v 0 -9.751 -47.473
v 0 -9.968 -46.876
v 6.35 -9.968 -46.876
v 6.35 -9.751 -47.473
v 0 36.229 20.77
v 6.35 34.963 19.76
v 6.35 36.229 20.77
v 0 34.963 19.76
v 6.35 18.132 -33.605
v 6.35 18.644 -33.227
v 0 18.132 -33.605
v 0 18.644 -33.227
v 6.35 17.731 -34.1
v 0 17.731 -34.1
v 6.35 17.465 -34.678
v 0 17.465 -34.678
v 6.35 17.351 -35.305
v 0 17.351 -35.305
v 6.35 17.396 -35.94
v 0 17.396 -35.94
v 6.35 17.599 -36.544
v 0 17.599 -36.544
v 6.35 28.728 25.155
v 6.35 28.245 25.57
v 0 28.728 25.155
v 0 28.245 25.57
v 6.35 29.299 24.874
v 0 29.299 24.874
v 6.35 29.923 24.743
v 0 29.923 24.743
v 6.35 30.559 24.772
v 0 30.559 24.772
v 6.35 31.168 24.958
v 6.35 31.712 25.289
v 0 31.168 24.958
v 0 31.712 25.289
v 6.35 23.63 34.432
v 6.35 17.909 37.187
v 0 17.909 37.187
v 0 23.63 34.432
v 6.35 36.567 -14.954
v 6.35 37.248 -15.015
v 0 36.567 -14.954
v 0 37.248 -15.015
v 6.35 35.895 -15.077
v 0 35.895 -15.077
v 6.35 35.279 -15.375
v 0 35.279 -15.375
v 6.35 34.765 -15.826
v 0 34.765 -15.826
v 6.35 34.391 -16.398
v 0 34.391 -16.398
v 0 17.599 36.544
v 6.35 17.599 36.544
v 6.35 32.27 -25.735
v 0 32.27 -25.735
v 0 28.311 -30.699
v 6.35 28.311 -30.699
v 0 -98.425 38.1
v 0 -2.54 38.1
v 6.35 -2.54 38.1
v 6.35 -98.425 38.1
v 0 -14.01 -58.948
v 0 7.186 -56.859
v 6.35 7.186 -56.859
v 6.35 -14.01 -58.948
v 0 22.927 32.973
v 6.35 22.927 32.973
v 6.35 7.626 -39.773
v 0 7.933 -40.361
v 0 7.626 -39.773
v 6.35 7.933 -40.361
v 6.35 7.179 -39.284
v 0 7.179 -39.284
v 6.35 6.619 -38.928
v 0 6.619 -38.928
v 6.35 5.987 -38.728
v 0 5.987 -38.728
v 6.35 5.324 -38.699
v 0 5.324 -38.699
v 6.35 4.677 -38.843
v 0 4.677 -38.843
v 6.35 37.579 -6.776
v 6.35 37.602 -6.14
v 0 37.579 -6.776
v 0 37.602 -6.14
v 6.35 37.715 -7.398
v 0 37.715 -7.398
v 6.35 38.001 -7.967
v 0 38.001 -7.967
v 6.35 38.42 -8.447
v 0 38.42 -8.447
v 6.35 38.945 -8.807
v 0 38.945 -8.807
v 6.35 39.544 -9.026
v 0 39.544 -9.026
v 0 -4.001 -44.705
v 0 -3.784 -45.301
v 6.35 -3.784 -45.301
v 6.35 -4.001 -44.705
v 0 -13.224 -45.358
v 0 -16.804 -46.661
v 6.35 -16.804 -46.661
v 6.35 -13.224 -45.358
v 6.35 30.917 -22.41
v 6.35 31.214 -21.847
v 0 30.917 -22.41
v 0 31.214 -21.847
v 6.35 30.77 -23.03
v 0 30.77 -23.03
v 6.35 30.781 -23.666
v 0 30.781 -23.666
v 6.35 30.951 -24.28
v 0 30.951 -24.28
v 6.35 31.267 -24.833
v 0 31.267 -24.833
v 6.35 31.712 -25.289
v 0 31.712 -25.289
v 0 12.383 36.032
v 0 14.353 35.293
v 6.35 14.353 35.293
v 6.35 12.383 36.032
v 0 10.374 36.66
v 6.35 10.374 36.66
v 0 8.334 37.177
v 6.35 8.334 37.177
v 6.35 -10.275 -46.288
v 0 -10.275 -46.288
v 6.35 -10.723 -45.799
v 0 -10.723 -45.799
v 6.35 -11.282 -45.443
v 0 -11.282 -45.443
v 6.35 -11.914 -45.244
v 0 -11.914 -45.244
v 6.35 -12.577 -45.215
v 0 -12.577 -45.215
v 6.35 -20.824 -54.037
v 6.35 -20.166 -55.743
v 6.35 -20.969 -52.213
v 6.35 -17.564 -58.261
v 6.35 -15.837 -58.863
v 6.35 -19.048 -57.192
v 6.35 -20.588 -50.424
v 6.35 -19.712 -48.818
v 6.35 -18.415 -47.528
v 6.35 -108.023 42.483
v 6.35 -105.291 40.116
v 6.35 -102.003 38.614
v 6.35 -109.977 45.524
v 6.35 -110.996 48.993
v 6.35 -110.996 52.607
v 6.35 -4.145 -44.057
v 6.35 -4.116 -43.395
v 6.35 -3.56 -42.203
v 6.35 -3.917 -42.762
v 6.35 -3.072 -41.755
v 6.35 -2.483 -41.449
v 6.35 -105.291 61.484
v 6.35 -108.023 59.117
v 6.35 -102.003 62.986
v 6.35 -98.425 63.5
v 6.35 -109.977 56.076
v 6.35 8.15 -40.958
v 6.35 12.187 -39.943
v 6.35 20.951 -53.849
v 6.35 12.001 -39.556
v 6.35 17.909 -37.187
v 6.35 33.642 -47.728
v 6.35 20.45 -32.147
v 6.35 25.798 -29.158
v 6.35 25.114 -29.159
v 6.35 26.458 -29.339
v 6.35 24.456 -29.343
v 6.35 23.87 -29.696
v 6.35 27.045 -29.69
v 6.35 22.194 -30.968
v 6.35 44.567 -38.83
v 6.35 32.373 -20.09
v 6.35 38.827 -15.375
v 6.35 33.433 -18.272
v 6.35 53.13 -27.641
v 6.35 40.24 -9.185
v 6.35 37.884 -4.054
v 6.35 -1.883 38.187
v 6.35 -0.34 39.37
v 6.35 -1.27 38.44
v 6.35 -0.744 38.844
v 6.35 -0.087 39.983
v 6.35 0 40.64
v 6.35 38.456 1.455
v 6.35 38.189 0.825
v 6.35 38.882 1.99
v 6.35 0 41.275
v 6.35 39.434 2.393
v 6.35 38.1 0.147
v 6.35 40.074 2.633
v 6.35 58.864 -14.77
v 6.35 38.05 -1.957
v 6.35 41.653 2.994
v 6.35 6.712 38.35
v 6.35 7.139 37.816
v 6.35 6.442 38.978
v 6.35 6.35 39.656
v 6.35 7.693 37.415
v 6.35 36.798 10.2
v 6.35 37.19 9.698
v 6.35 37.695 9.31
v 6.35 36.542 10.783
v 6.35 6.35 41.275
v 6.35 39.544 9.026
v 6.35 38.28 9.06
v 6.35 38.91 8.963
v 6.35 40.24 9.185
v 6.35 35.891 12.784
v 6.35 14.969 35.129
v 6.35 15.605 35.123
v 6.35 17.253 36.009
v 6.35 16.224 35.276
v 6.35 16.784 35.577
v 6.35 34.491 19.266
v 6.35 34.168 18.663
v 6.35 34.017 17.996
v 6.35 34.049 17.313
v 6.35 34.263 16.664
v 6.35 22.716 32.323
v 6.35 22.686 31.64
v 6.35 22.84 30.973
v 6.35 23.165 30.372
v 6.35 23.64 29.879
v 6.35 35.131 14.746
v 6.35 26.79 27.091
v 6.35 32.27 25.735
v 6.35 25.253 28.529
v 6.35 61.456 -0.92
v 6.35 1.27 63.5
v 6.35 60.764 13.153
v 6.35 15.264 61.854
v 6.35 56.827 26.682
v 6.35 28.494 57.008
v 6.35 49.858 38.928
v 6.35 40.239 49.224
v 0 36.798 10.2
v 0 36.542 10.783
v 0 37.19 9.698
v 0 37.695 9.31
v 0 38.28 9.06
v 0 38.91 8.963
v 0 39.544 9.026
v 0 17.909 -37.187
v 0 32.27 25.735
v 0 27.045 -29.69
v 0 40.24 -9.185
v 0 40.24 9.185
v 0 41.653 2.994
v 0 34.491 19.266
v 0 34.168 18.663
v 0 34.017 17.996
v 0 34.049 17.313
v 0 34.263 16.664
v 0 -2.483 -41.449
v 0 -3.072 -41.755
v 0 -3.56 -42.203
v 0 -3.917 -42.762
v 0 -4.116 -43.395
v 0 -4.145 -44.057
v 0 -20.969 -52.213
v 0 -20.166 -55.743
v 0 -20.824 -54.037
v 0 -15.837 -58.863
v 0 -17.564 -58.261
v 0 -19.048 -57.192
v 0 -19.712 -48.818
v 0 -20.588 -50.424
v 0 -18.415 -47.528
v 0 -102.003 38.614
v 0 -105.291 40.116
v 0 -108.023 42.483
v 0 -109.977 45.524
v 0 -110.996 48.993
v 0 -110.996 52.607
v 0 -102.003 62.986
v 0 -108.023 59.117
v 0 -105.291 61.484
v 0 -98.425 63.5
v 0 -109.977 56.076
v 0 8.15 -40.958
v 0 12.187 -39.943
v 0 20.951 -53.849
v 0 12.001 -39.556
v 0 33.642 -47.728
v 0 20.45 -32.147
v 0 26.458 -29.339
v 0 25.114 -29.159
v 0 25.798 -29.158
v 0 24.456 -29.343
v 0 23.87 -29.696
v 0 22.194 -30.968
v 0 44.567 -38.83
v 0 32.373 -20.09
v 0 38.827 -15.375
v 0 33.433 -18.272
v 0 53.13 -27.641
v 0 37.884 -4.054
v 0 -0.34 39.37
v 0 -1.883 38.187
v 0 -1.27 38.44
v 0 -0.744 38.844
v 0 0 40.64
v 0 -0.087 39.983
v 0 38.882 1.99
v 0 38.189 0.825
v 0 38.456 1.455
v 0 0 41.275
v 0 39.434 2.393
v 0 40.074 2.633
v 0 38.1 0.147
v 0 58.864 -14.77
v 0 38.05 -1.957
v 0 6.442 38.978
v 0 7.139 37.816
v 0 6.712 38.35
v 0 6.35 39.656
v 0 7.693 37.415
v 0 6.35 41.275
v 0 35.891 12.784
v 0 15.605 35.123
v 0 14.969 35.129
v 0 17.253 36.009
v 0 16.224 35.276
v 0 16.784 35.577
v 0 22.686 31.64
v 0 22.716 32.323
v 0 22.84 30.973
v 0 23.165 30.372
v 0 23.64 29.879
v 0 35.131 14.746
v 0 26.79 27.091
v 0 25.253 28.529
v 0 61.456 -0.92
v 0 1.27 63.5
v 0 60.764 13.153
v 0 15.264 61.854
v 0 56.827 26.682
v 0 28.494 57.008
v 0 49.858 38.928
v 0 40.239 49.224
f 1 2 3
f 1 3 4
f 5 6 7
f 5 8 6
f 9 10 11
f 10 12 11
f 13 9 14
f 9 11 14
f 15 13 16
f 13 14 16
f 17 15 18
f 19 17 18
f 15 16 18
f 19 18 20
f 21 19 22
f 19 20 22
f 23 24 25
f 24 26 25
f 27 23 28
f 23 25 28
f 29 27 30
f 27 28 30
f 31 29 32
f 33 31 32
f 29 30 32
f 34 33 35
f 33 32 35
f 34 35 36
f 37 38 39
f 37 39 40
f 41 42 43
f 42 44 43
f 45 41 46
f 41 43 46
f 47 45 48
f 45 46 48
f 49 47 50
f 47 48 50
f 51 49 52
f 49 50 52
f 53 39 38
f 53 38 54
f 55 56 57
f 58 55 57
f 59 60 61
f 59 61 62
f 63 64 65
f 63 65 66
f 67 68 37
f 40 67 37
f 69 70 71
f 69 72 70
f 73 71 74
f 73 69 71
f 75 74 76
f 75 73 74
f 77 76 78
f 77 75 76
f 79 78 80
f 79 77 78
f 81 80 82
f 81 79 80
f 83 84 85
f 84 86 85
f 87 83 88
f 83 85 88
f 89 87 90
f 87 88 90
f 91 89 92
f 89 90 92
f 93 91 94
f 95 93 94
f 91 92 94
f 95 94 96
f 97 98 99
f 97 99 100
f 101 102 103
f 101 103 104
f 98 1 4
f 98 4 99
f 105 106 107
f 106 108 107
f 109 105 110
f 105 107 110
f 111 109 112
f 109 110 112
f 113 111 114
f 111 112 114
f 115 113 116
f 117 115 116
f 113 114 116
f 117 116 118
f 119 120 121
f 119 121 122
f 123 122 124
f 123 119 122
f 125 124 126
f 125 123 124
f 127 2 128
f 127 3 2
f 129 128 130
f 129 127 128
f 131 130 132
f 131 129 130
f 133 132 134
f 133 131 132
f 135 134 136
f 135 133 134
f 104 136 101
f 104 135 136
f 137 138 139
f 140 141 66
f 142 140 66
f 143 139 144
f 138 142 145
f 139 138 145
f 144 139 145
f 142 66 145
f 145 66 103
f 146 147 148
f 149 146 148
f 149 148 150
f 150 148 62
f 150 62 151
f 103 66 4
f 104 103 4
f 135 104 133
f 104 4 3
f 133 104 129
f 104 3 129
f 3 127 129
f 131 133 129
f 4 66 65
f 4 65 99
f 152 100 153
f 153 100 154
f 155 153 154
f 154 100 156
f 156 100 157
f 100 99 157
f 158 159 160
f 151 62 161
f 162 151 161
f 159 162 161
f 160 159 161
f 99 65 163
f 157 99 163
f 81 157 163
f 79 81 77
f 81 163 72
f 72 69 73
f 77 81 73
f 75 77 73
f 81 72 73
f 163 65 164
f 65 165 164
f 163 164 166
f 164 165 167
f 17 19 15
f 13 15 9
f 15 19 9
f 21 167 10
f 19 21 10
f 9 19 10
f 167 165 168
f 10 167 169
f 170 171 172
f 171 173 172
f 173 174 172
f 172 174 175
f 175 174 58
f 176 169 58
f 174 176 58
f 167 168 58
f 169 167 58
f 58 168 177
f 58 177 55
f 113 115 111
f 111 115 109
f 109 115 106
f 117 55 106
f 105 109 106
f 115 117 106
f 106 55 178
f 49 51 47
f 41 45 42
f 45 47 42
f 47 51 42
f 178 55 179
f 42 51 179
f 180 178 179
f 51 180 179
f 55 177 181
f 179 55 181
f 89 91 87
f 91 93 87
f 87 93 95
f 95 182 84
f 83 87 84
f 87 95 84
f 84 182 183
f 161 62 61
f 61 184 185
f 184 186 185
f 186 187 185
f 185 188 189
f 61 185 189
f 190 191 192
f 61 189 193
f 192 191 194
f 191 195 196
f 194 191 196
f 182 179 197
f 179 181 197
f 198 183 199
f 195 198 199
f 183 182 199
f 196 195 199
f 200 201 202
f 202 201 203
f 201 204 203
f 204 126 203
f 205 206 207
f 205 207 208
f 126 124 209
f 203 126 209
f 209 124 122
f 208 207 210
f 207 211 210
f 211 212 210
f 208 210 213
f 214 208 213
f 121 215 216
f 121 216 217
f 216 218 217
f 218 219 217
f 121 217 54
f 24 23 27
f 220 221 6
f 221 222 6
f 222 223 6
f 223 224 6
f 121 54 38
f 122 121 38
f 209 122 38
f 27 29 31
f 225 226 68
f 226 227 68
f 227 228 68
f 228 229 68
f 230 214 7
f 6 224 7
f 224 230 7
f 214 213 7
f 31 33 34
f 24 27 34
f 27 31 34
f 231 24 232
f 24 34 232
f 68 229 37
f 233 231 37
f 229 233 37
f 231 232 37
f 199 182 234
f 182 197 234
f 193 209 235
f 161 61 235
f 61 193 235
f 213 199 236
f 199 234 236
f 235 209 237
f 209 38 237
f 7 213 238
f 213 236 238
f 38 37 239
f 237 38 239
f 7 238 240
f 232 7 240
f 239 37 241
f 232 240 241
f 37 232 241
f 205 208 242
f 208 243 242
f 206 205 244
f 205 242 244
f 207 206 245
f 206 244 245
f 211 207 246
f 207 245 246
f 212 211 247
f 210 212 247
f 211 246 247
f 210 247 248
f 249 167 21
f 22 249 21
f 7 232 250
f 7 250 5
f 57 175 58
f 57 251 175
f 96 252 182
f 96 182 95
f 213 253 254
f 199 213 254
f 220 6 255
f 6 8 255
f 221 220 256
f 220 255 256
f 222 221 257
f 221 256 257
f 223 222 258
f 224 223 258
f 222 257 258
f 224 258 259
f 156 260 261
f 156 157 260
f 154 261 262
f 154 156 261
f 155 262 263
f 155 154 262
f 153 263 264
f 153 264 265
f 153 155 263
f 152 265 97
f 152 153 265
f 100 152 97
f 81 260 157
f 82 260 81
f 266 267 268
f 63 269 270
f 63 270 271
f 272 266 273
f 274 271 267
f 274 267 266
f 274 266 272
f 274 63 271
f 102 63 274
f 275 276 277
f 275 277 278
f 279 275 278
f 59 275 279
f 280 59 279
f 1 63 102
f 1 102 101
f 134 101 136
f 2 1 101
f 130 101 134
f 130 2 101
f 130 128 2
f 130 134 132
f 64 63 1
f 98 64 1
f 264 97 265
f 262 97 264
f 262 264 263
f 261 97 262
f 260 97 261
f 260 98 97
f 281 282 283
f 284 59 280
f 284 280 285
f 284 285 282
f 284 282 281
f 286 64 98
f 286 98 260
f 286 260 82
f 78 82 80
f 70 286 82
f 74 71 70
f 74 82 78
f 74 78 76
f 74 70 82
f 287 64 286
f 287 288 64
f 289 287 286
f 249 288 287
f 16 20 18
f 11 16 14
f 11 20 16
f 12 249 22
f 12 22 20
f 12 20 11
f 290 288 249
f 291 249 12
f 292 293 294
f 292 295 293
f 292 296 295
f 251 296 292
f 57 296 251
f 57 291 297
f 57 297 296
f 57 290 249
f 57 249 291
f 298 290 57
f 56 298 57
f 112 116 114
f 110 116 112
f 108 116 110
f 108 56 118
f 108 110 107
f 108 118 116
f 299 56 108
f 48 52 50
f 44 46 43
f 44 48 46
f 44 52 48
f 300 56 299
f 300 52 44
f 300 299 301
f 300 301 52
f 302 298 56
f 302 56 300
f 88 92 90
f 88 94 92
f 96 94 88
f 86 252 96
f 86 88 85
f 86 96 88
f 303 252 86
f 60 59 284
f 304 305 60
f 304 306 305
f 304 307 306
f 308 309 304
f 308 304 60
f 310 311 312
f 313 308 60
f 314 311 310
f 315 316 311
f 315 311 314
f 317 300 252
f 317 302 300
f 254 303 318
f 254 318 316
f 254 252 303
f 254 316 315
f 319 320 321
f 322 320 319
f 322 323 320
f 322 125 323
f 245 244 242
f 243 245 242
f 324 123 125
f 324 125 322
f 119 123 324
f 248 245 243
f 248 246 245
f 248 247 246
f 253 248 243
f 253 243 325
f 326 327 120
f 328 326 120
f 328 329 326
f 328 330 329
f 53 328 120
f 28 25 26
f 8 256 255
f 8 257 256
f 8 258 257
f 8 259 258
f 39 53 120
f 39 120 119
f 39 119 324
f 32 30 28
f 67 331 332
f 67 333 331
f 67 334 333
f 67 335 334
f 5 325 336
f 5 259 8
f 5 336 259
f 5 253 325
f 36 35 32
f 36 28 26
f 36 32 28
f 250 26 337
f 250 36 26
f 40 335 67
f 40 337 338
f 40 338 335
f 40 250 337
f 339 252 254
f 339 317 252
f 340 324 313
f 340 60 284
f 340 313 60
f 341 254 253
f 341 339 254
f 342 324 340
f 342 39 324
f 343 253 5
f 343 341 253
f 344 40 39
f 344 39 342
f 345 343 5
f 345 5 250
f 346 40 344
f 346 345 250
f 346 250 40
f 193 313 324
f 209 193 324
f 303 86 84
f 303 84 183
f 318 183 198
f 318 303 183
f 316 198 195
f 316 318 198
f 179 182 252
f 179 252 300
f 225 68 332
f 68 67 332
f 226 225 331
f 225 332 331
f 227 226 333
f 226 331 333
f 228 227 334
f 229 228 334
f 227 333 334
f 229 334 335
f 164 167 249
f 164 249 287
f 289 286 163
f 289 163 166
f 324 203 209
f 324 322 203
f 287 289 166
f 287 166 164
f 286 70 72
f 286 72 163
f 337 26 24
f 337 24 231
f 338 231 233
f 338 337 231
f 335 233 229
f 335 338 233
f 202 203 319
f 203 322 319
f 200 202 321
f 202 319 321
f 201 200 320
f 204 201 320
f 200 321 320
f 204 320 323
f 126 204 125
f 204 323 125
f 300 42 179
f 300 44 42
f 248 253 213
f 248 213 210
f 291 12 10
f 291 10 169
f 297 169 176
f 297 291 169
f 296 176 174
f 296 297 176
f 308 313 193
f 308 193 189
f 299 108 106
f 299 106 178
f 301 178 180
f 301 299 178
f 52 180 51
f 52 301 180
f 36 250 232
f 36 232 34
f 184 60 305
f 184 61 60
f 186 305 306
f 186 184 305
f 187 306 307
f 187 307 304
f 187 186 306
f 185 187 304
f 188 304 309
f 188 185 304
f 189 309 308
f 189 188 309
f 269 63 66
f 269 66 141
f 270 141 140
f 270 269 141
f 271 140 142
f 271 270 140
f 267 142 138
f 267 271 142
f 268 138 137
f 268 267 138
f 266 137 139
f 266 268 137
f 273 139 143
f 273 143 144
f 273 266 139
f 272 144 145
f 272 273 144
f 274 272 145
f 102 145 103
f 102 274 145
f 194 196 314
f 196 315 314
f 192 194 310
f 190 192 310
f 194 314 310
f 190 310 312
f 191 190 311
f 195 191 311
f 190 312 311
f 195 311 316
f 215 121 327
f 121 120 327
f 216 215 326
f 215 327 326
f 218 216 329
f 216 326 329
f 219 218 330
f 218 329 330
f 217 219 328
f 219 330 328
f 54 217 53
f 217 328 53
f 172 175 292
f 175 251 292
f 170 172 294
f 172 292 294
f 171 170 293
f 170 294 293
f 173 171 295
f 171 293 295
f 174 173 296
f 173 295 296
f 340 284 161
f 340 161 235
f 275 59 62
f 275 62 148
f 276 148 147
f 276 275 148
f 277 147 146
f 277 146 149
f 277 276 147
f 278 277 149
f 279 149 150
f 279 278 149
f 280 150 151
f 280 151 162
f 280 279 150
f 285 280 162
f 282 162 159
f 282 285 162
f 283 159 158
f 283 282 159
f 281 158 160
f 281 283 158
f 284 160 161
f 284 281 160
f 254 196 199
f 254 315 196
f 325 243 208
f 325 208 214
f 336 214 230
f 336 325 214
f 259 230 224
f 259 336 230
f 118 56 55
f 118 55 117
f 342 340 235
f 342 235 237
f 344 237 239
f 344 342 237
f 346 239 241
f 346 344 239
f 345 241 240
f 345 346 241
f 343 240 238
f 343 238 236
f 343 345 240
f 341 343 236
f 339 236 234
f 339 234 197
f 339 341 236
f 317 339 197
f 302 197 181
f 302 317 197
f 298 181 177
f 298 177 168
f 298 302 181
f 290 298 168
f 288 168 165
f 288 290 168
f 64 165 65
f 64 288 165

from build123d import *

# Parameters (mm, degrees)
BOSS_EXTRUDE1_DEPTH = 6.35
CUT_EXTRUDE1_START  = -7.35
CUT_EXTRUDE1_DEPTH  = 8.35
LPATTERN1_COUNT     = 2
LPATTERN1_PITCH     = 19.05
CUT_EXTRUDE2_START  = -7.35
CUT_EXTRUDE2_DEPTH  = 8.35
CIRPATTERN2_COUNT   = 8
CIRPATTERN2_ANGLE   = 180
FILLET1_R           = 2.54


with BuildPart() as part:
    # Sketch1 → Boss-Extrude1 (new body)
    with BuildSketch(Plane(origin=(0, 0, 0), x_dir=(0, 0, -1), z_dir=(1, 0, 0))):
        with BuildLine():
            Line((-63.5, -98.425), (-63.5, 1.27))
            ThreePointArc((-63.5, 1.27), (-6.13650031, 61.522262538), (56.859225559, 7.185858903))
            Line((56.859225559, 7.185858903), (58.947868709, -14.009723349))
            ThreePointArc((58.947868709, -14.009723349), (54.036813814, -20.824301776), (46.661428403, -16.804273249))
            Line((46.661428403, -16.804273249), (35.802288852, 13.030967461))
            ThreePointArc((35.802288852, 13.030967461), (-6.615995569, 37.52117539), (-38.1, 0))
            Line((-38.1, 0), (-38.1, -98.425))
            ThreePointArc((-38.1, -98.425), (-50.8, -111.125), (-63.5, -98.425))
        make_face()
    extrude(amount=BOSS_EXTRUDE1_DEPTH)

    # Sketch4 → Cut-Extrude1 (cut)
    with BuildSketch(Plane(origin=(6.35, 0, 0), x_dir=(0, 0, -1), z_dir=(1, 0, 0)).offset(CUT_EXTRUDE1_START)):
        Polygon((44.489600492, -10.837225107), (47.473124563, -9.751311152), (45.301296653, -3.78426301), (42.317772582, -4.870176965), align=None)
    cut_extrude1 = extrude(amount=CUT_EXTRUDE1_DEPTH, mode=Mode.SUBTRACT)

    # LPattern1: Cut-Extrude1 ×2
    with Locations(*[Vector(0, 0.939692621, 0.342020143) * (i * LPATTERN1_PITCH) for i in range(1, LPATTERN1_COUNT)]):
        add(cut_extrude1, mode=Mode.SUBTRACT)

    # Sketch5 → Cut-Extrude2 (cut)
    with BuildSketch(Plane(origin=(6.35, 0, 0), x_dir=(0, 0, -1), z_dir=(1, 0, 0)).offset(CUT_EXTRUDE2_START)):
        Polygon((-38.1, 0), (-41.275, 0), (-41.275, 6.35), (-38.1, 6.35), (-35.06174314, 6.35), (-35.06174314, 0), align=None)
    cut_extrude2 = extrude(amount=CUT_EXTRUDE2_DEPTH, mode=Mode.SUBTRACT)

    # CirPattern2: Cut-Extrude2 ×8 about axis, 1 skipped
    cirpattern2_axis = Axis((0, 0, 0), (-1, 0, 0))
    add([cut_extrude2.rotate(cirpattern2_axis, i * CIRPATTERN2_ANGLE / (CIRPATTERN2_COUNT - 1)) for i in range(1, CIRPATTERN2_COUNT) if i not in (7,)], mode=Mode.SUBTRACT)

    # Fillet1
    fillet1_edges = [part.edges().sort_by_distance(p)[0] for p in [
        (3.175, 16.53097046, 34.326913867),
        (3.175, 22.020909, 31.091631781),
        (3.175, 29.787779482, 23.754961451),
        (3.175, 33.330306905, 18.458077951),
        (3.175, 37.144753454, 8.478047584),
        (3.175, 38.038228757, 2.168675409),
        (3.175, 37.144753454, -8.478047584),
        (3.175, 0, 38.1),
        (3.175, 35.212212896, -14.550259894),
        (3.175, 29.787779482, -23.754961451),
        (3.175, 25.411986421, -28.387337778),
        (3.175, 16.53097046, -34.326913867),
        (3.175, -10.837225107, -44.489600492),
        (3.175, -4.870176965, -42.317772582),
        (3.175, 7.063919319, -37.974116762),
        (3.175, 6.35, 37.567106623),
    ]]
    fillet(fillet1_edges, radius=FILLET1_R)


solid = part.part
